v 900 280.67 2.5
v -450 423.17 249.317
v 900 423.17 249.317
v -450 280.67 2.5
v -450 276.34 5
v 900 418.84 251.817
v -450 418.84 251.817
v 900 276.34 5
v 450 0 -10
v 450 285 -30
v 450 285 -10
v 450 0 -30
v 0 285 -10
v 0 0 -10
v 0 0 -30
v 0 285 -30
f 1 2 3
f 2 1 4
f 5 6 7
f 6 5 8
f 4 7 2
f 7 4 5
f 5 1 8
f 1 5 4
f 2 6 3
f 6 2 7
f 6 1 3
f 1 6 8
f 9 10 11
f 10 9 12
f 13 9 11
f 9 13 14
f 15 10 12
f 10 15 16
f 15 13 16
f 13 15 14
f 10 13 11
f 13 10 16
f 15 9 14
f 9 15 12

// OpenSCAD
// file: time_utility.scad
// Utility functions to help manage time steps $t
// 2017/04/28 - Roger Cheng

// Returns 0-1 for the portion of time between start/end.
function timeRanged(start, current, end) = 
    current<=start? 0 : 
        (current>=end ? 1 : 
            ((current-start)/(end-start)));

// Symmetric animation 0 to 1 to 0 while $t goes 0 to 1
function timeSymmetric() = abs($t-0.5)*2;

// A little padding on either end of timeSymmetric()
padStart=0.1;
padEnd=0.9;
function timePadded() = timeRanged(padStart, timeSymmetric(), padEnd);
// main file
// Razer Valerie
// 2017/05/10 - Roger Cheng
use <time_utility.scad>

screenW = 450;
screenH = 285;
screenD = 5;

bodyW = screenW;
bodyH = screenH;
bodyD = 20;

// Time utilities
function scrOpen() = timeRanged(0, timePadded(), 0.5);
function scrSlide() = timeRanged(0.5, timePadded(), 1.0);

// Physical construction

module screen()
{
    cube([screenW, screenH, screenD]);
}

module center()
{
    translate([0, 0, -screenD*2])
    screen();
}

module left()
{
    translate([-screenW*scrSlide(), 0, -screenD*scrSlide()])
    translate([0, 0,-screenD])
    screen();
}

module right()
{
    translate([screenW*scrSlide(), 0, -screenD*2*scrSlide()])
    screen();
}

module screenAssembly()
{
    // Translate back to position
    translate([0, screenH, 0])    
    // Screen open hinge rotation
    rotate([-120*scrOpen(), 0, 0])
    // Translate for hinge rotation
    translate([0, -screenH, 0])
    
    // The set of screens
    union()
    {
        color([0.5, 0, 0]) left();
        color([0, 0.5, 0]) center();
        color([0, 0, 0.5]) right();
    }
}

module bodyAssembly()
{
    translate([0, 0, -bodyD-screenD*2])
    cube([bodyW, bodyH, bodyD]);
}

module masterAssembly()
{
    screenAssembly();
    bodyAssembly();
}

masterAssembly();
